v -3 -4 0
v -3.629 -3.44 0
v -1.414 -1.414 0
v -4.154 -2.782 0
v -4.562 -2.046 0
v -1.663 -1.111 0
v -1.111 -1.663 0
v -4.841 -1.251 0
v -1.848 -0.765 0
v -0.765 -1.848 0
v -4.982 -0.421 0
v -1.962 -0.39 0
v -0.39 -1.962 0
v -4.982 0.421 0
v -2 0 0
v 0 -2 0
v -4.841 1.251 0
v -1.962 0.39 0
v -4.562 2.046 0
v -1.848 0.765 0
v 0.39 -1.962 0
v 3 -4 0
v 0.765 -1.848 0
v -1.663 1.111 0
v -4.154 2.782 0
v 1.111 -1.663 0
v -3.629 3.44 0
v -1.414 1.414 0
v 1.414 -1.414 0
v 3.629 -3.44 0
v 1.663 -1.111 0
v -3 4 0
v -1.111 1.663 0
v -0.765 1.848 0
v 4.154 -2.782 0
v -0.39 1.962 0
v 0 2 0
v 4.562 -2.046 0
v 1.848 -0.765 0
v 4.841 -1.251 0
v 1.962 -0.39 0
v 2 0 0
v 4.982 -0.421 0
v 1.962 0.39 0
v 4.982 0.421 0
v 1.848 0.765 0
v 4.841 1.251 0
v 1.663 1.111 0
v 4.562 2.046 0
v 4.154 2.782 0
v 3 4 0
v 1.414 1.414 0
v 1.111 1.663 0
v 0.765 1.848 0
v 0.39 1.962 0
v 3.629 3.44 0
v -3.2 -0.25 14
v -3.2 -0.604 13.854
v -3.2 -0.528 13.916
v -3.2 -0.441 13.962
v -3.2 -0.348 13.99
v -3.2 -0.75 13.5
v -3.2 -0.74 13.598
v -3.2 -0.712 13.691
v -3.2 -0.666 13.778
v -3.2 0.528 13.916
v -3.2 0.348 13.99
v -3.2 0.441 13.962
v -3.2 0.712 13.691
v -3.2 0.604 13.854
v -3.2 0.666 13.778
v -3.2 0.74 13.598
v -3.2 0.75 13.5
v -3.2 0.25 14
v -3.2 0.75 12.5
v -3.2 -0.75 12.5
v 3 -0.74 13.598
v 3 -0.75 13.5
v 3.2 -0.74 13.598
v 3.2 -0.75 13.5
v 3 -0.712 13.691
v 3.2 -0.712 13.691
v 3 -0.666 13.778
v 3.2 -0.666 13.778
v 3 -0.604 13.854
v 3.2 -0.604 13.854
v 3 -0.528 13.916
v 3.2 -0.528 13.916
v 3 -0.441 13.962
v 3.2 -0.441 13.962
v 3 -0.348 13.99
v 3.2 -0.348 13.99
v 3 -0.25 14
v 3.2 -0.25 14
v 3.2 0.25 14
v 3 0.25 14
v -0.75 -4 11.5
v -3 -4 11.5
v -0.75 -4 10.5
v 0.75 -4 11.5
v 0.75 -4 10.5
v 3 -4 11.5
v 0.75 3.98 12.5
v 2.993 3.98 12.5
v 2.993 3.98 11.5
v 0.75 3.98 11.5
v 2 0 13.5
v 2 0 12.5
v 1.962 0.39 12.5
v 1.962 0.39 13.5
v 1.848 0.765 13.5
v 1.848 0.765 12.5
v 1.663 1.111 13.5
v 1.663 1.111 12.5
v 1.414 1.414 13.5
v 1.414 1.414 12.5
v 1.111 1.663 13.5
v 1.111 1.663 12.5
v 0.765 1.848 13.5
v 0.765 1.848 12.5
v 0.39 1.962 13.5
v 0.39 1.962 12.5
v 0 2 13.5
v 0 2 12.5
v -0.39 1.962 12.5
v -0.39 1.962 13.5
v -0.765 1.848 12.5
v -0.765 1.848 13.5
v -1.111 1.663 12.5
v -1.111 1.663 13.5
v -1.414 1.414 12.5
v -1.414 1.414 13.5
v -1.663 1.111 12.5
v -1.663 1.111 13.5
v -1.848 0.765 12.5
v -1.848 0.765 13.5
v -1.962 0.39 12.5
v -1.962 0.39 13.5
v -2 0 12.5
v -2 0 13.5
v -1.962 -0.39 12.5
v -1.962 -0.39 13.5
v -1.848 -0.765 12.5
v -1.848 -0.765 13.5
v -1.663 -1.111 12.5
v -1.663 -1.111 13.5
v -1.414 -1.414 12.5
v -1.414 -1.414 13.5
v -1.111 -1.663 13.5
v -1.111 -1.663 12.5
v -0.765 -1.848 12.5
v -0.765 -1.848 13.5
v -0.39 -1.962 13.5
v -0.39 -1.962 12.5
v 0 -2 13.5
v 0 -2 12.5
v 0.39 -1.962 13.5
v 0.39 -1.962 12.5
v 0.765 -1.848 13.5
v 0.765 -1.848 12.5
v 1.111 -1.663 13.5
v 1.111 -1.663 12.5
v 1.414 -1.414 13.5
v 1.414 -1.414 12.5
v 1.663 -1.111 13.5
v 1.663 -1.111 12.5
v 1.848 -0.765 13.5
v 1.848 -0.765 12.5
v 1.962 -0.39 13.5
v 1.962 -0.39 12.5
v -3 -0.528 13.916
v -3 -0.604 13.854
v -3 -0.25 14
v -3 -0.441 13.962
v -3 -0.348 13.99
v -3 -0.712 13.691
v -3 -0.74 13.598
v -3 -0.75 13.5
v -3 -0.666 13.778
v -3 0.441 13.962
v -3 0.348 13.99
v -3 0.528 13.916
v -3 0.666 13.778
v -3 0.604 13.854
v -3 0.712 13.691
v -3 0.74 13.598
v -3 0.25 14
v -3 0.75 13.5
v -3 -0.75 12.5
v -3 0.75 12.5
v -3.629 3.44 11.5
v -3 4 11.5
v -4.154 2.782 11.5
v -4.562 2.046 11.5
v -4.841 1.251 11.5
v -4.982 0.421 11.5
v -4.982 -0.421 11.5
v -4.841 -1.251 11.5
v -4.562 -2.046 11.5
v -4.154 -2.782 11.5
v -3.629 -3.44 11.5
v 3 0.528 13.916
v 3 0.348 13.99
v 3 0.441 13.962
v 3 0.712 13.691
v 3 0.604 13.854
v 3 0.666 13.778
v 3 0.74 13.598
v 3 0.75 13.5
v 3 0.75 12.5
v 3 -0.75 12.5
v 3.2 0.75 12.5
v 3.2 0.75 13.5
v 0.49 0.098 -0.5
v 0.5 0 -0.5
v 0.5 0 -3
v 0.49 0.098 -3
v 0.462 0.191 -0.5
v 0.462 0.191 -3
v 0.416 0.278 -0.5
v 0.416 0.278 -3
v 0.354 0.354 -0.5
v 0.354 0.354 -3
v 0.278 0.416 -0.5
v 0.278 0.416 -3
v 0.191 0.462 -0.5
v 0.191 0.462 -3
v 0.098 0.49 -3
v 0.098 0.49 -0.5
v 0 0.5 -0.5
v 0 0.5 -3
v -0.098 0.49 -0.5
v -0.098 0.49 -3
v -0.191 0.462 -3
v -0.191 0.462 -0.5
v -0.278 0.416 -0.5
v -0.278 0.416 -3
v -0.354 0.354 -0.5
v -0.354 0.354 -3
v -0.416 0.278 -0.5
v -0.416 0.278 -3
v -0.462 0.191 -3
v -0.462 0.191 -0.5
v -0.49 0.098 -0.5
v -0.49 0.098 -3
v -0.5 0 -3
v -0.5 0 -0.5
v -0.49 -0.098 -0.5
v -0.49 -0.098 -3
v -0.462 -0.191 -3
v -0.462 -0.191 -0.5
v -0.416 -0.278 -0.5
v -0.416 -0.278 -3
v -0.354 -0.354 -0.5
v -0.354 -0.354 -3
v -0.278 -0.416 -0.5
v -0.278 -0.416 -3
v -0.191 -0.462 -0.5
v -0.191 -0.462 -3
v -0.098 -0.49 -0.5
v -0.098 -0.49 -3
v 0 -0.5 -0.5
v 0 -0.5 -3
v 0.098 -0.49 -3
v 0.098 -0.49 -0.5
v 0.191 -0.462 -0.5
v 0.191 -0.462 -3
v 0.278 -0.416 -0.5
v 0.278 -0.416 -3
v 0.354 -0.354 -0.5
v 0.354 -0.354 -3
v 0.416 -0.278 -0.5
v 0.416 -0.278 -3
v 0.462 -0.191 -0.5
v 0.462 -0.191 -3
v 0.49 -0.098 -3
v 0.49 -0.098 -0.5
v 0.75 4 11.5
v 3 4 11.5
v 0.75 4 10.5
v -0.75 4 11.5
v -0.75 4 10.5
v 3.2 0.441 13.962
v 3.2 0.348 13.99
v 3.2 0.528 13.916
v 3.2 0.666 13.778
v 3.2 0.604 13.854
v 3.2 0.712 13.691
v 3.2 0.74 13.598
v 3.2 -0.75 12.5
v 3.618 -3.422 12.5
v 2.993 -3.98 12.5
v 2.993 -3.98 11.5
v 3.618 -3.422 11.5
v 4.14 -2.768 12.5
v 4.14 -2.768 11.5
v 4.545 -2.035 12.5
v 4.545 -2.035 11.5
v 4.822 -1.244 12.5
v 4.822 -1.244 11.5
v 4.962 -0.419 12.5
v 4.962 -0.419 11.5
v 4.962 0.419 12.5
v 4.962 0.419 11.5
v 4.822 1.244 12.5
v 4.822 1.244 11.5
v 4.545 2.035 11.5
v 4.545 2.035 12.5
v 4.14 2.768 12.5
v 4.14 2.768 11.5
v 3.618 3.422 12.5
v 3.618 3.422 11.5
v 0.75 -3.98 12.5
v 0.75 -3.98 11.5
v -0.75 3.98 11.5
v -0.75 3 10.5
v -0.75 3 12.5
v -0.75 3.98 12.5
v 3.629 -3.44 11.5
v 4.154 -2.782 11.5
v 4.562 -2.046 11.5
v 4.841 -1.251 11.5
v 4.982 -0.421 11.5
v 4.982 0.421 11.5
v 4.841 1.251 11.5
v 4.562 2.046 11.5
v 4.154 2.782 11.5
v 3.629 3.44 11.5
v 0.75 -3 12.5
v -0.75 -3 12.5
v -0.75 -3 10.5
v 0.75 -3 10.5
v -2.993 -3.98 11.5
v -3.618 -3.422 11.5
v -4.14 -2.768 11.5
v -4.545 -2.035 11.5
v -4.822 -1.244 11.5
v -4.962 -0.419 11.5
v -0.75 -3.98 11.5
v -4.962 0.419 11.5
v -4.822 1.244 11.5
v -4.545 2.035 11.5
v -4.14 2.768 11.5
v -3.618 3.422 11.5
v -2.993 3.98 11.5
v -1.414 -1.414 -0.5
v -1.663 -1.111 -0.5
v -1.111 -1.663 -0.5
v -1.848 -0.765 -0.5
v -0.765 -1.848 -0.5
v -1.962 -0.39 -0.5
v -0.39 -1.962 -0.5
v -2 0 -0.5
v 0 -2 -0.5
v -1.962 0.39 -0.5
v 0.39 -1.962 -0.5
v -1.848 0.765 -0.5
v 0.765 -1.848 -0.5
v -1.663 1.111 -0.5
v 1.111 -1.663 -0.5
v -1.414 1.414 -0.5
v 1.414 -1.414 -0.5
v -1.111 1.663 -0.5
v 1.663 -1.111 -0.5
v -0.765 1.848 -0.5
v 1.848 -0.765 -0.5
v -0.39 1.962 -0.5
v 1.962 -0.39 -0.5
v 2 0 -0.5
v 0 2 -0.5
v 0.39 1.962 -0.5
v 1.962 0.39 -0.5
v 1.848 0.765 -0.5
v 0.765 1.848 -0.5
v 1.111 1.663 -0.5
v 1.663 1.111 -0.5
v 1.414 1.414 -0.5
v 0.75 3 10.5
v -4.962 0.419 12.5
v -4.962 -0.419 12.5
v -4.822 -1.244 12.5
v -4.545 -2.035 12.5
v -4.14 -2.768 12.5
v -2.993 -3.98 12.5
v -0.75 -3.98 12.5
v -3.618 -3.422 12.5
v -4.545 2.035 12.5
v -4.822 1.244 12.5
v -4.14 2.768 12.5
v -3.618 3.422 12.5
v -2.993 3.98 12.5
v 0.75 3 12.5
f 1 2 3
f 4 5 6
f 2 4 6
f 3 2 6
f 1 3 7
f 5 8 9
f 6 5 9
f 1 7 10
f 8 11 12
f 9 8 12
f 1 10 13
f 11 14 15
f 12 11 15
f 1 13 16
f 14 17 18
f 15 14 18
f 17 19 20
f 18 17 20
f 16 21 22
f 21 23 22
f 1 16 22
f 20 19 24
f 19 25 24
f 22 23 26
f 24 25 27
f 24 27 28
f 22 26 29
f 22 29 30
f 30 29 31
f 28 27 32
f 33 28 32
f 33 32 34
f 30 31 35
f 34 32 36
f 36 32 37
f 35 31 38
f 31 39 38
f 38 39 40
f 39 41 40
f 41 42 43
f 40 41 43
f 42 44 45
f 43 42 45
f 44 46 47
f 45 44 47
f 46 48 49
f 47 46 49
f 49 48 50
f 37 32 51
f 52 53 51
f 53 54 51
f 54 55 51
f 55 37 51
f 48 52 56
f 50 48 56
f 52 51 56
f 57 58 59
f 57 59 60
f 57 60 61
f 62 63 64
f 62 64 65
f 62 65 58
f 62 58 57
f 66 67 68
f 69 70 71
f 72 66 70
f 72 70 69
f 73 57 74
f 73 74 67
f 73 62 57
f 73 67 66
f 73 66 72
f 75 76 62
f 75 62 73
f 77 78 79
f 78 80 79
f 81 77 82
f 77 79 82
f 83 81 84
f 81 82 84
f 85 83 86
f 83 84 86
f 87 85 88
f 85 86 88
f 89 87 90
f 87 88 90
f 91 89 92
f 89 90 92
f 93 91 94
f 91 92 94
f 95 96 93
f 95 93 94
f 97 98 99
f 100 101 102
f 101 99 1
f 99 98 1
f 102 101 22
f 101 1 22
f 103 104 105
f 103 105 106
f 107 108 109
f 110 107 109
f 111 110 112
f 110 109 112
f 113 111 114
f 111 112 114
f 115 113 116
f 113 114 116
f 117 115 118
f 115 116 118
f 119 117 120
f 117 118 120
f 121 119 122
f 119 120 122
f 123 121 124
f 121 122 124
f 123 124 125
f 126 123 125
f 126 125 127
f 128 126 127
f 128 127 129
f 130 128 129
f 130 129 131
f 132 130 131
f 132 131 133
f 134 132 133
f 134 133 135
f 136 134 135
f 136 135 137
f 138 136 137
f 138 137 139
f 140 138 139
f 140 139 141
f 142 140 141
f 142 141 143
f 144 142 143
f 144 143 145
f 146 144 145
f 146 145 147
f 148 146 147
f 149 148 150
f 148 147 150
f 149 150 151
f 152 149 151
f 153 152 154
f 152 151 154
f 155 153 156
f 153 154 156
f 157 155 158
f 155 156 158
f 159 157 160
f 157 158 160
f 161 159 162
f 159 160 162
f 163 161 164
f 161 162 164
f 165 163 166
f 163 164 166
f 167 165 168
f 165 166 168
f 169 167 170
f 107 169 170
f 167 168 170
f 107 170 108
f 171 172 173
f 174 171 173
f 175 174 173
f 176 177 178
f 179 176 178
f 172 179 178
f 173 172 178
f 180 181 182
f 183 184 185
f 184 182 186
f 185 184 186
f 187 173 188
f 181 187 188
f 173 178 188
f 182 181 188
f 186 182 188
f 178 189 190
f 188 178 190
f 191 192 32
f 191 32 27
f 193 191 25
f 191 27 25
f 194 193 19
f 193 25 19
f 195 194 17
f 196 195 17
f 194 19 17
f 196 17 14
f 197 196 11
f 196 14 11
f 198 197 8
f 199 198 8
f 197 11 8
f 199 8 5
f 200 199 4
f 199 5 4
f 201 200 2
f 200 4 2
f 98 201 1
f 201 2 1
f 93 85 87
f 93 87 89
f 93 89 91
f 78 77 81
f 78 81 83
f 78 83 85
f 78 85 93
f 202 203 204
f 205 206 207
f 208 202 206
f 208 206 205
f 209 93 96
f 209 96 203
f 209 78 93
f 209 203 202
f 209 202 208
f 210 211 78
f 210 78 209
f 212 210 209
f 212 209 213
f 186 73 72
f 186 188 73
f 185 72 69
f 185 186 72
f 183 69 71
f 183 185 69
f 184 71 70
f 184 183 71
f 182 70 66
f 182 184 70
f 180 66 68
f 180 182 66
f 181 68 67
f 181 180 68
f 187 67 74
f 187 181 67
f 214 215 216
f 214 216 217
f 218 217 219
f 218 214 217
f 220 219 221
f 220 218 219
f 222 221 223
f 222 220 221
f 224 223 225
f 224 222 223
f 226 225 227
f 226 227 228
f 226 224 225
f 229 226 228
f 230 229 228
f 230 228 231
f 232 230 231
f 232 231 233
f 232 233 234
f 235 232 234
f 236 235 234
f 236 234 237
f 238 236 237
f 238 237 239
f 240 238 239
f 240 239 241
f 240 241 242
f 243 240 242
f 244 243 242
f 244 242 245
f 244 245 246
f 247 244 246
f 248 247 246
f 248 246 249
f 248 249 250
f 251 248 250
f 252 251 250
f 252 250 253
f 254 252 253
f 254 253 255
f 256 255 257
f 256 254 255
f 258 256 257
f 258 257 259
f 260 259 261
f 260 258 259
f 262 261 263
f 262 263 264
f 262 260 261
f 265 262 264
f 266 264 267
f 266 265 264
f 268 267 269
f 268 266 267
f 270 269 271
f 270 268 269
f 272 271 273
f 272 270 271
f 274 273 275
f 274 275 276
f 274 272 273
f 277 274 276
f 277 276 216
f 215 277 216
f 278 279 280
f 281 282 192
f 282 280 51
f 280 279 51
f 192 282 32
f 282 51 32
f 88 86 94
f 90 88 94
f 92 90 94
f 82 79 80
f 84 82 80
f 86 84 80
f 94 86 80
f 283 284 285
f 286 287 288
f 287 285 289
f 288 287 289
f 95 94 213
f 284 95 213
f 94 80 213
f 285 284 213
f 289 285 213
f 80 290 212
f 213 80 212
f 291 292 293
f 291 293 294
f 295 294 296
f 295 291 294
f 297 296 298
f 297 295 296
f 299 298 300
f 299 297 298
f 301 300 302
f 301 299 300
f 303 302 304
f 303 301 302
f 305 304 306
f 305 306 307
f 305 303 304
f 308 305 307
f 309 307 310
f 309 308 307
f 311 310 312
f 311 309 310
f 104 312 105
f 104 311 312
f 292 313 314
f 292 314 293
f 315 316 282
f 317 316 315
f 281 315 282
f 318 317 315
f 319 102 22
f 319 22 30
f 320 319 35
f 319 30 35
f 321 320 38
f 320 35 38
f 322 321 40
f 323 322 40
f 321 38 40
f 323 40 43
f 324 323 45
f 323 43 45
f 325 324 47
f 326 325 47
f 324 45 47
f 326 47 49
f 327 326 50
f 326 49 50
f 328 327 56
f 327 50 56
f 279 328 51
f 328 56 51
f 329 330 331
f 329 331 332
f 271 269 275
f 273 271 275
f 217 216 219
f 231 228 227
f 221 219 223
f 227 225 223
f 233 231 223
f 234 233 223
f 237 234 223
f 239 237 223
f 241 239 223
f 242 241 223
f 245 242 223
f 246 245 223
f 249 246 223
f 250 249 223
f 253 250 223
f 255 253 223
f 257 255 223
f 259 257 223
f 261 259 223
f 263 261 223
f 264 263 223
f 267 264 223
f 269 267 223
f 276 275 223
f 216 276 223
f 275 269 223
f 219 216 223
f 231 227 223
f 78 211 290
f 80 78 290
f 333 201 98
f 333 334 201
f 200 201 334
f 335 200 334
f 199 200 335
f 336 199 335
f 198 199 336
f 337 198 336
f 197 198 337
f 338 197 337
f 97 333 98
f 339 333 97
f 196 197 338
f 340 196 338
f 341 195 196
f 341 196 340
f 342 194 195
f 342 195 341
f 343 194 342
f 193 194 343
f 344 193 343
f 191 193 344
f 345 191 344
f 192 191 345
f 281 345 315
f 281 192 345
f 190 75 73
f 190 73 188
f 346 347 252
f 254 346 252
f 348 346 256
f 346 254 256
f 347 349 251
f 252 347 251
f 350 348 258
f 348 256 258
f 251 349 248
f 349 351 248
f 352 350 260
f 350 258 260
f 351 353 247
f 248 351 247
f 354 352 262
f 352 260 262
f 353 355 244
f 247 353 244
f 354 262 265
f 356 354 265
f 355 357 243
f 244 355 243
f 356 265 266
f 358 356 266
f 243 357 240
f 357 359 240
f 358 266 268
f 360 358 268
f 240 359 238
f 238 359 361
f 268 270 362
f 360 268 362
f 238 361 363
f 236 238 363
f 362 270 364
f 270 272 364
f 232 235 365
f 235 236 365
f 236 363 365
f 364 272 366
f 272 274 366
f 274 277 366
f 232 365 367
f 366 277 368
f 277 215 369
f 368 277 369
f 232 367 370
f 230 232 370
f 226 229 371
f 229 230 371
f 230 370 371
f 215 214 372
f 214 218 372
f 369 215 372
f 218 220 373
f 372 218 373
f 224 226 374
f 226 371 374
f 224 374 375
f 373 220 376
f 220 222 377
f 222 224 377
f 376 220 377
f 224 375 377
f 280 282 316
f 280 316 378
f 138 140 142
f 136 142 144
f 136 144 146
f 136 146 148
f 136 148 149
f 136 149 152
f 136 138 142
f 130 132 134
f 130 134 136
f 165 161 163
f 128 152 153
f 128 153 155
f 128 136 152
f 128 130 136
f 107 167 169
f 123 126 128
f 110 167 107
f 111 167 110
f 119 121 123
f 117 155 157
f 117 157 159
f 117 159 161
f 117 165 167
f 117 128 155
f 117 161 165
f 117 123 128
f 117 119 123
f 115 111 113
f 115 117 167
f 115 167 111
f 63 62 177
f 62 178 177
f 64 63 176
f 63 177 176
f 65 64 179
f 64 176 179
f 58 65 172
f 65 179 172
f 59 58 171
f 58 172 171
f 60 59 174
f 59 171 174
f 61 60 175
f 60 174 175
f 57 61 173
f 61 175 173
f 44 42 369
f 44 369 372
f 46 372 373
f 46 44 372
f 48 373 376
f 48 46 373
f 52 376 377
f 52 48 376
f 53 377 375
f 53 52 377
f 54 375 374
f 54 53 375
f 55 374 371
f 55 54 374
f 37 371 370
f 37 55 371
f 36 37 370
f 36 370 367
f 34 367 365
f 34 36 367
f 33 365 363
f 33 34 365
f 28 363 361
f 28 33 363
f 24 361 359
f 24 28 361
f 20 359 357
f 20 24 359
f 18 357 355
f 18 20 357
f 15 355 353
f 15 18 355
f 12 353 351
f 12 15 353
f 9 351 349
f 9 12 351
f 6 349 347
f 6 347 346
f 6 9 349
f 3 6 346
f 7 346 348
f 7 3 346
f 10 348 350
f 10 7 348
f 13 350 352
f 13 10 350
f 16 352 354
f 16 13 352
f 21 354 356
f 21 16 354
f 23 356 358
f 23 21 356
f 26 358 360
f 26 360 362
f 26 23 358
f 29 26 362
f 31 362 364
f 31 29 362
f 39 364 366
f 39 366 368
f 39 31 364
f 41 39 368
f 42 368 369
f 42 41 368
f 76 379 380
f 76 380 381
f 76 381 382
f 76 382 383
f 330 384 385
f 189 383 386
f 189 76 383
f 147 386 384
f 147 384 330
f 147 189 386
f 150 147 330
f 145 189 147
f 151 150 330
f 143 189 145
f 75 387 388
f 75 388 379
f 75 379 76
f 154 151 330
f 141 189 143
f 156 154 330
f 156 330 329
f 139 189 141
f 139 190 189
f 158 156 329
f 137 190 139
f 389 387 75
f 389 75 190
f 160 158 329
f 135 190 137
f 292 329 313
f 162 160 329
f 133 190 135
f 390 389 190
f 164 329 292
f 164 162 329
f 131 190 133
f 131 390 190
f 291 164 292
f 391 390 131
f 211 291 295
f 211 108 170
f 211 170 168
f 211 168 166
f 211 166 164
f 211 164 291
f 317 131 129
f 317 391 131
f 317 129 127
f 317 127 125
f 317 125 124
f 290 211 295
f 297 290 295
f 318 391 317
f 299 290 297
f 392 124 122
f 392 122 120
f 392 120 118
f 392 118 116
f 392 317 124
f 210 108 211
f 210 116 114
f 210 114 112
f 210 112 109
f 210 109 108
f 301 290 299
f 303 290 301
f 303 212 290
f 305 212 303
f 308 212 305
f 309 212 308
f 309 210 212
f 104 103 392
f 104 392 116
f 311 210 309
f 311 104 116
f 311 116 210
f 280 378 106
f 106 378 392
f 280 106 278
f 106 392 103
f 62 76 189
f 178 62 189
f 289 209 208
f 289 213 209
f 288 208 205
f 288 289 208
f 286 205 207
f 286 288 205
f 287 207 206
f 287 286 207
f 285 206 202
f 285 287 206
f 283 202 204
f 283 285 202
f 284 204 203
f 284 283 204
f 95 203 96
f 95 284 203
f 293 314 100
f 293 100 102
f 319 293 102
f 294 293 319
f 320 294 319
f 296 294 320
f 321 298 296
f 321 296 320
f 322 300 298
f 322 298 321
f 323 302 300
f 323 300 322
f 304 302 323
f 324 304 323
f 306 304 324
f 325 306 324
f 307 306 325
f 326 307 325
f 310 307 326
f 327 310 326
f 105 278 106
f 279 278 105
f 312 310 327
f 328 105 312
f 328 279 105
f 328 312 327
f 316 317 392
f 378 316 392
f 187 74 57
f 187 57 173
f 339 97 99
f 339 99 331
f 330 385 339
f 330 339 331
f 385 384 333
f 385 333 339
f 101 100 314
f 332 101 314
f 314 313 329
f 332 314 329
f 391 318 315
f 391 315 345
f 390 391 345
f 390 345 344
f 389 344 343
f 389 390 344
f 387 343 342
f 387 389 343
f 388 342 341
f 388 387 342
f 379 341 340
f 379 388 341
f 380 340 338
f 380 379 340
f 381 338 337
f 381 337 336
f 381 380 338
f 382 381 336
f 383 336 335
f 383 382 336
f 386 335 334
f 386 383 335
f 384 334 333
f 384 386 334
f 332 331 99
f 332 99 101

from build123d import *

# Parameters (mm, degrees)
BOSS_EXTRUDE1_DEPTH = 12.5
SKETCH2_R           = 2
SKETCH2_R_2         = 0.5
BOSS_EXTRUDE2_DEPTH = 0.5
SKETCH2_2_R         = 0.5
BOSS_EXTRUDE3_DEPTH = 3
SKETCH2_4_R         = 2
BOSS_EXTRUDE4_DEPTH = 13.5
CUT_EXTRUDE1_START  = 12.5
SKETCH4_W           = 1.5
SKETCH4_H           = 2
CUT_EXTRUDE1_DEPTH  = 2
BOSS_EXTRUDE5_START = 12.5
SKETCH5_W           = 0.2
SKETCH5_H           = 1.5
BOSS_EXTRUDE5_DEPTH = 1.5
FILLET1_R           = 0.5
CUT_EXTRUDE2_START  = 12.5
CUT_EXTRUDE2_DEPTH  = 1


with BuildPart() as part:
    # Sketch1 → Boss-Extrude1 (new body)
    with BuildSketch(Plane.XY):
        with BuildLine():
            Line((-3, -4), (3, -4))
            ThreePointArc((3, -4), (5, 0), (3, 4))
            Line((3, 4), (-3, 4))
            ThreePointArc((-3, 4), (-5, 0), (-3, -4))
        make_face()
    extrude(amount=BOSS_EXTRUDE1_DEPTH)

    # Sketch2 → Boss-Extrude2 (add)
    with BuildSketch(Plane.XY):
        Circle(SKETCH2_R)
        Circle(SKETCH2_R_2, mode=Mode.SUBTRACT)
    extrude(amount=-BOSS_EXTRUDE2_DEPTH)

    # Sketch2<2> → Boss-Extrude3 (add)
    with BuildSketch(Plane.XY):
        Circle(SKETCH2_2_R)
    extrude(amount=-BOSS_EXTRUDE3_DEPTH)

    # Sketch2<4> → Boss-Extrude4 (add)
    with BuildSketch(Plane.XY):
        Circle(SKETCH2_4_R)
    extrude(amount=BOSS_EXTRUDE4_DEPTH)

    # Sketch4 → Cut-Extrude1 (cut)
    with BuildSketch(Plane.XY.offset(CUT_EXTRUDE1_START)):
        with Locations((0, 4)):
            Rectangle(SKETCH4_W, SKETCH4_H)
        with Locations((0, -4)):
            Rectangle(SKETCH4_W, SKETCH4_H)
    extrude(amount=-CUT_EXTRUDE1_DEPTH, mode=Mode.SUBTRACT)

    # Sketch5 → Boss-Extrude5 (add)
    with BuildSketch(Plane.XY.offset(BOSS_EXTRUDE5_START)):
        with Locations((3.1, 0)):
            Rectangle(SKETCH5_W, SKETCH5_H)
        with Locations((-3.1, 0)):
            Rectangle(SKETCH5_W, SKETCH5_H)
    extrude(amount=BOSS_EXTRUDE5_DEPTH)

    # Fillet1
    fillet1_edges = [part.edges().sort_by_distance(p)[0] for p in [
        (3.1, -0.75, 14),
        (3.1, 0.75, 14),
        (-3.1, -0.75, 14),
        (-3.1, 0.75, 14),
    ]]
    fillet(fillet1_edges, radius=FILLET1_R)

    # Sketch6 → Cut-Extrude2 (cut)
    with BuildSketch(Plane.XY.offset(CUT_EXTRUDE2_START)):
        with BuildLine():
            Line((-3, -4), (3, -4))
            ThreePointArc((3, -4), (5, 0), (3, 4))
            Line((3, 4), (-3, 4))
            ThreePointArc((-3, 4), (-5, 0), (-3, -4))
        make_face()
        with BuildLine():
            Line((-2.993325909, -3.98), (2.993325909, -3.98))
            ThreePointArc((2.993325909, -3.98), (4.98, 0), (2.993325909, 3.98))
            Line((2.993325909, 3.98), (-2.993325909, 3.98))
            ThreePointArc((-2.993325909, 3.98), (-4.98, 0), (-2.993325909, -3.98))
        make_face(mode=Mode.SUBTRACT)
    extrude(amount=-CUT_EXTRUDE2_DEPTH, mode=Mode.SUBTRACT)


solid = part.part
